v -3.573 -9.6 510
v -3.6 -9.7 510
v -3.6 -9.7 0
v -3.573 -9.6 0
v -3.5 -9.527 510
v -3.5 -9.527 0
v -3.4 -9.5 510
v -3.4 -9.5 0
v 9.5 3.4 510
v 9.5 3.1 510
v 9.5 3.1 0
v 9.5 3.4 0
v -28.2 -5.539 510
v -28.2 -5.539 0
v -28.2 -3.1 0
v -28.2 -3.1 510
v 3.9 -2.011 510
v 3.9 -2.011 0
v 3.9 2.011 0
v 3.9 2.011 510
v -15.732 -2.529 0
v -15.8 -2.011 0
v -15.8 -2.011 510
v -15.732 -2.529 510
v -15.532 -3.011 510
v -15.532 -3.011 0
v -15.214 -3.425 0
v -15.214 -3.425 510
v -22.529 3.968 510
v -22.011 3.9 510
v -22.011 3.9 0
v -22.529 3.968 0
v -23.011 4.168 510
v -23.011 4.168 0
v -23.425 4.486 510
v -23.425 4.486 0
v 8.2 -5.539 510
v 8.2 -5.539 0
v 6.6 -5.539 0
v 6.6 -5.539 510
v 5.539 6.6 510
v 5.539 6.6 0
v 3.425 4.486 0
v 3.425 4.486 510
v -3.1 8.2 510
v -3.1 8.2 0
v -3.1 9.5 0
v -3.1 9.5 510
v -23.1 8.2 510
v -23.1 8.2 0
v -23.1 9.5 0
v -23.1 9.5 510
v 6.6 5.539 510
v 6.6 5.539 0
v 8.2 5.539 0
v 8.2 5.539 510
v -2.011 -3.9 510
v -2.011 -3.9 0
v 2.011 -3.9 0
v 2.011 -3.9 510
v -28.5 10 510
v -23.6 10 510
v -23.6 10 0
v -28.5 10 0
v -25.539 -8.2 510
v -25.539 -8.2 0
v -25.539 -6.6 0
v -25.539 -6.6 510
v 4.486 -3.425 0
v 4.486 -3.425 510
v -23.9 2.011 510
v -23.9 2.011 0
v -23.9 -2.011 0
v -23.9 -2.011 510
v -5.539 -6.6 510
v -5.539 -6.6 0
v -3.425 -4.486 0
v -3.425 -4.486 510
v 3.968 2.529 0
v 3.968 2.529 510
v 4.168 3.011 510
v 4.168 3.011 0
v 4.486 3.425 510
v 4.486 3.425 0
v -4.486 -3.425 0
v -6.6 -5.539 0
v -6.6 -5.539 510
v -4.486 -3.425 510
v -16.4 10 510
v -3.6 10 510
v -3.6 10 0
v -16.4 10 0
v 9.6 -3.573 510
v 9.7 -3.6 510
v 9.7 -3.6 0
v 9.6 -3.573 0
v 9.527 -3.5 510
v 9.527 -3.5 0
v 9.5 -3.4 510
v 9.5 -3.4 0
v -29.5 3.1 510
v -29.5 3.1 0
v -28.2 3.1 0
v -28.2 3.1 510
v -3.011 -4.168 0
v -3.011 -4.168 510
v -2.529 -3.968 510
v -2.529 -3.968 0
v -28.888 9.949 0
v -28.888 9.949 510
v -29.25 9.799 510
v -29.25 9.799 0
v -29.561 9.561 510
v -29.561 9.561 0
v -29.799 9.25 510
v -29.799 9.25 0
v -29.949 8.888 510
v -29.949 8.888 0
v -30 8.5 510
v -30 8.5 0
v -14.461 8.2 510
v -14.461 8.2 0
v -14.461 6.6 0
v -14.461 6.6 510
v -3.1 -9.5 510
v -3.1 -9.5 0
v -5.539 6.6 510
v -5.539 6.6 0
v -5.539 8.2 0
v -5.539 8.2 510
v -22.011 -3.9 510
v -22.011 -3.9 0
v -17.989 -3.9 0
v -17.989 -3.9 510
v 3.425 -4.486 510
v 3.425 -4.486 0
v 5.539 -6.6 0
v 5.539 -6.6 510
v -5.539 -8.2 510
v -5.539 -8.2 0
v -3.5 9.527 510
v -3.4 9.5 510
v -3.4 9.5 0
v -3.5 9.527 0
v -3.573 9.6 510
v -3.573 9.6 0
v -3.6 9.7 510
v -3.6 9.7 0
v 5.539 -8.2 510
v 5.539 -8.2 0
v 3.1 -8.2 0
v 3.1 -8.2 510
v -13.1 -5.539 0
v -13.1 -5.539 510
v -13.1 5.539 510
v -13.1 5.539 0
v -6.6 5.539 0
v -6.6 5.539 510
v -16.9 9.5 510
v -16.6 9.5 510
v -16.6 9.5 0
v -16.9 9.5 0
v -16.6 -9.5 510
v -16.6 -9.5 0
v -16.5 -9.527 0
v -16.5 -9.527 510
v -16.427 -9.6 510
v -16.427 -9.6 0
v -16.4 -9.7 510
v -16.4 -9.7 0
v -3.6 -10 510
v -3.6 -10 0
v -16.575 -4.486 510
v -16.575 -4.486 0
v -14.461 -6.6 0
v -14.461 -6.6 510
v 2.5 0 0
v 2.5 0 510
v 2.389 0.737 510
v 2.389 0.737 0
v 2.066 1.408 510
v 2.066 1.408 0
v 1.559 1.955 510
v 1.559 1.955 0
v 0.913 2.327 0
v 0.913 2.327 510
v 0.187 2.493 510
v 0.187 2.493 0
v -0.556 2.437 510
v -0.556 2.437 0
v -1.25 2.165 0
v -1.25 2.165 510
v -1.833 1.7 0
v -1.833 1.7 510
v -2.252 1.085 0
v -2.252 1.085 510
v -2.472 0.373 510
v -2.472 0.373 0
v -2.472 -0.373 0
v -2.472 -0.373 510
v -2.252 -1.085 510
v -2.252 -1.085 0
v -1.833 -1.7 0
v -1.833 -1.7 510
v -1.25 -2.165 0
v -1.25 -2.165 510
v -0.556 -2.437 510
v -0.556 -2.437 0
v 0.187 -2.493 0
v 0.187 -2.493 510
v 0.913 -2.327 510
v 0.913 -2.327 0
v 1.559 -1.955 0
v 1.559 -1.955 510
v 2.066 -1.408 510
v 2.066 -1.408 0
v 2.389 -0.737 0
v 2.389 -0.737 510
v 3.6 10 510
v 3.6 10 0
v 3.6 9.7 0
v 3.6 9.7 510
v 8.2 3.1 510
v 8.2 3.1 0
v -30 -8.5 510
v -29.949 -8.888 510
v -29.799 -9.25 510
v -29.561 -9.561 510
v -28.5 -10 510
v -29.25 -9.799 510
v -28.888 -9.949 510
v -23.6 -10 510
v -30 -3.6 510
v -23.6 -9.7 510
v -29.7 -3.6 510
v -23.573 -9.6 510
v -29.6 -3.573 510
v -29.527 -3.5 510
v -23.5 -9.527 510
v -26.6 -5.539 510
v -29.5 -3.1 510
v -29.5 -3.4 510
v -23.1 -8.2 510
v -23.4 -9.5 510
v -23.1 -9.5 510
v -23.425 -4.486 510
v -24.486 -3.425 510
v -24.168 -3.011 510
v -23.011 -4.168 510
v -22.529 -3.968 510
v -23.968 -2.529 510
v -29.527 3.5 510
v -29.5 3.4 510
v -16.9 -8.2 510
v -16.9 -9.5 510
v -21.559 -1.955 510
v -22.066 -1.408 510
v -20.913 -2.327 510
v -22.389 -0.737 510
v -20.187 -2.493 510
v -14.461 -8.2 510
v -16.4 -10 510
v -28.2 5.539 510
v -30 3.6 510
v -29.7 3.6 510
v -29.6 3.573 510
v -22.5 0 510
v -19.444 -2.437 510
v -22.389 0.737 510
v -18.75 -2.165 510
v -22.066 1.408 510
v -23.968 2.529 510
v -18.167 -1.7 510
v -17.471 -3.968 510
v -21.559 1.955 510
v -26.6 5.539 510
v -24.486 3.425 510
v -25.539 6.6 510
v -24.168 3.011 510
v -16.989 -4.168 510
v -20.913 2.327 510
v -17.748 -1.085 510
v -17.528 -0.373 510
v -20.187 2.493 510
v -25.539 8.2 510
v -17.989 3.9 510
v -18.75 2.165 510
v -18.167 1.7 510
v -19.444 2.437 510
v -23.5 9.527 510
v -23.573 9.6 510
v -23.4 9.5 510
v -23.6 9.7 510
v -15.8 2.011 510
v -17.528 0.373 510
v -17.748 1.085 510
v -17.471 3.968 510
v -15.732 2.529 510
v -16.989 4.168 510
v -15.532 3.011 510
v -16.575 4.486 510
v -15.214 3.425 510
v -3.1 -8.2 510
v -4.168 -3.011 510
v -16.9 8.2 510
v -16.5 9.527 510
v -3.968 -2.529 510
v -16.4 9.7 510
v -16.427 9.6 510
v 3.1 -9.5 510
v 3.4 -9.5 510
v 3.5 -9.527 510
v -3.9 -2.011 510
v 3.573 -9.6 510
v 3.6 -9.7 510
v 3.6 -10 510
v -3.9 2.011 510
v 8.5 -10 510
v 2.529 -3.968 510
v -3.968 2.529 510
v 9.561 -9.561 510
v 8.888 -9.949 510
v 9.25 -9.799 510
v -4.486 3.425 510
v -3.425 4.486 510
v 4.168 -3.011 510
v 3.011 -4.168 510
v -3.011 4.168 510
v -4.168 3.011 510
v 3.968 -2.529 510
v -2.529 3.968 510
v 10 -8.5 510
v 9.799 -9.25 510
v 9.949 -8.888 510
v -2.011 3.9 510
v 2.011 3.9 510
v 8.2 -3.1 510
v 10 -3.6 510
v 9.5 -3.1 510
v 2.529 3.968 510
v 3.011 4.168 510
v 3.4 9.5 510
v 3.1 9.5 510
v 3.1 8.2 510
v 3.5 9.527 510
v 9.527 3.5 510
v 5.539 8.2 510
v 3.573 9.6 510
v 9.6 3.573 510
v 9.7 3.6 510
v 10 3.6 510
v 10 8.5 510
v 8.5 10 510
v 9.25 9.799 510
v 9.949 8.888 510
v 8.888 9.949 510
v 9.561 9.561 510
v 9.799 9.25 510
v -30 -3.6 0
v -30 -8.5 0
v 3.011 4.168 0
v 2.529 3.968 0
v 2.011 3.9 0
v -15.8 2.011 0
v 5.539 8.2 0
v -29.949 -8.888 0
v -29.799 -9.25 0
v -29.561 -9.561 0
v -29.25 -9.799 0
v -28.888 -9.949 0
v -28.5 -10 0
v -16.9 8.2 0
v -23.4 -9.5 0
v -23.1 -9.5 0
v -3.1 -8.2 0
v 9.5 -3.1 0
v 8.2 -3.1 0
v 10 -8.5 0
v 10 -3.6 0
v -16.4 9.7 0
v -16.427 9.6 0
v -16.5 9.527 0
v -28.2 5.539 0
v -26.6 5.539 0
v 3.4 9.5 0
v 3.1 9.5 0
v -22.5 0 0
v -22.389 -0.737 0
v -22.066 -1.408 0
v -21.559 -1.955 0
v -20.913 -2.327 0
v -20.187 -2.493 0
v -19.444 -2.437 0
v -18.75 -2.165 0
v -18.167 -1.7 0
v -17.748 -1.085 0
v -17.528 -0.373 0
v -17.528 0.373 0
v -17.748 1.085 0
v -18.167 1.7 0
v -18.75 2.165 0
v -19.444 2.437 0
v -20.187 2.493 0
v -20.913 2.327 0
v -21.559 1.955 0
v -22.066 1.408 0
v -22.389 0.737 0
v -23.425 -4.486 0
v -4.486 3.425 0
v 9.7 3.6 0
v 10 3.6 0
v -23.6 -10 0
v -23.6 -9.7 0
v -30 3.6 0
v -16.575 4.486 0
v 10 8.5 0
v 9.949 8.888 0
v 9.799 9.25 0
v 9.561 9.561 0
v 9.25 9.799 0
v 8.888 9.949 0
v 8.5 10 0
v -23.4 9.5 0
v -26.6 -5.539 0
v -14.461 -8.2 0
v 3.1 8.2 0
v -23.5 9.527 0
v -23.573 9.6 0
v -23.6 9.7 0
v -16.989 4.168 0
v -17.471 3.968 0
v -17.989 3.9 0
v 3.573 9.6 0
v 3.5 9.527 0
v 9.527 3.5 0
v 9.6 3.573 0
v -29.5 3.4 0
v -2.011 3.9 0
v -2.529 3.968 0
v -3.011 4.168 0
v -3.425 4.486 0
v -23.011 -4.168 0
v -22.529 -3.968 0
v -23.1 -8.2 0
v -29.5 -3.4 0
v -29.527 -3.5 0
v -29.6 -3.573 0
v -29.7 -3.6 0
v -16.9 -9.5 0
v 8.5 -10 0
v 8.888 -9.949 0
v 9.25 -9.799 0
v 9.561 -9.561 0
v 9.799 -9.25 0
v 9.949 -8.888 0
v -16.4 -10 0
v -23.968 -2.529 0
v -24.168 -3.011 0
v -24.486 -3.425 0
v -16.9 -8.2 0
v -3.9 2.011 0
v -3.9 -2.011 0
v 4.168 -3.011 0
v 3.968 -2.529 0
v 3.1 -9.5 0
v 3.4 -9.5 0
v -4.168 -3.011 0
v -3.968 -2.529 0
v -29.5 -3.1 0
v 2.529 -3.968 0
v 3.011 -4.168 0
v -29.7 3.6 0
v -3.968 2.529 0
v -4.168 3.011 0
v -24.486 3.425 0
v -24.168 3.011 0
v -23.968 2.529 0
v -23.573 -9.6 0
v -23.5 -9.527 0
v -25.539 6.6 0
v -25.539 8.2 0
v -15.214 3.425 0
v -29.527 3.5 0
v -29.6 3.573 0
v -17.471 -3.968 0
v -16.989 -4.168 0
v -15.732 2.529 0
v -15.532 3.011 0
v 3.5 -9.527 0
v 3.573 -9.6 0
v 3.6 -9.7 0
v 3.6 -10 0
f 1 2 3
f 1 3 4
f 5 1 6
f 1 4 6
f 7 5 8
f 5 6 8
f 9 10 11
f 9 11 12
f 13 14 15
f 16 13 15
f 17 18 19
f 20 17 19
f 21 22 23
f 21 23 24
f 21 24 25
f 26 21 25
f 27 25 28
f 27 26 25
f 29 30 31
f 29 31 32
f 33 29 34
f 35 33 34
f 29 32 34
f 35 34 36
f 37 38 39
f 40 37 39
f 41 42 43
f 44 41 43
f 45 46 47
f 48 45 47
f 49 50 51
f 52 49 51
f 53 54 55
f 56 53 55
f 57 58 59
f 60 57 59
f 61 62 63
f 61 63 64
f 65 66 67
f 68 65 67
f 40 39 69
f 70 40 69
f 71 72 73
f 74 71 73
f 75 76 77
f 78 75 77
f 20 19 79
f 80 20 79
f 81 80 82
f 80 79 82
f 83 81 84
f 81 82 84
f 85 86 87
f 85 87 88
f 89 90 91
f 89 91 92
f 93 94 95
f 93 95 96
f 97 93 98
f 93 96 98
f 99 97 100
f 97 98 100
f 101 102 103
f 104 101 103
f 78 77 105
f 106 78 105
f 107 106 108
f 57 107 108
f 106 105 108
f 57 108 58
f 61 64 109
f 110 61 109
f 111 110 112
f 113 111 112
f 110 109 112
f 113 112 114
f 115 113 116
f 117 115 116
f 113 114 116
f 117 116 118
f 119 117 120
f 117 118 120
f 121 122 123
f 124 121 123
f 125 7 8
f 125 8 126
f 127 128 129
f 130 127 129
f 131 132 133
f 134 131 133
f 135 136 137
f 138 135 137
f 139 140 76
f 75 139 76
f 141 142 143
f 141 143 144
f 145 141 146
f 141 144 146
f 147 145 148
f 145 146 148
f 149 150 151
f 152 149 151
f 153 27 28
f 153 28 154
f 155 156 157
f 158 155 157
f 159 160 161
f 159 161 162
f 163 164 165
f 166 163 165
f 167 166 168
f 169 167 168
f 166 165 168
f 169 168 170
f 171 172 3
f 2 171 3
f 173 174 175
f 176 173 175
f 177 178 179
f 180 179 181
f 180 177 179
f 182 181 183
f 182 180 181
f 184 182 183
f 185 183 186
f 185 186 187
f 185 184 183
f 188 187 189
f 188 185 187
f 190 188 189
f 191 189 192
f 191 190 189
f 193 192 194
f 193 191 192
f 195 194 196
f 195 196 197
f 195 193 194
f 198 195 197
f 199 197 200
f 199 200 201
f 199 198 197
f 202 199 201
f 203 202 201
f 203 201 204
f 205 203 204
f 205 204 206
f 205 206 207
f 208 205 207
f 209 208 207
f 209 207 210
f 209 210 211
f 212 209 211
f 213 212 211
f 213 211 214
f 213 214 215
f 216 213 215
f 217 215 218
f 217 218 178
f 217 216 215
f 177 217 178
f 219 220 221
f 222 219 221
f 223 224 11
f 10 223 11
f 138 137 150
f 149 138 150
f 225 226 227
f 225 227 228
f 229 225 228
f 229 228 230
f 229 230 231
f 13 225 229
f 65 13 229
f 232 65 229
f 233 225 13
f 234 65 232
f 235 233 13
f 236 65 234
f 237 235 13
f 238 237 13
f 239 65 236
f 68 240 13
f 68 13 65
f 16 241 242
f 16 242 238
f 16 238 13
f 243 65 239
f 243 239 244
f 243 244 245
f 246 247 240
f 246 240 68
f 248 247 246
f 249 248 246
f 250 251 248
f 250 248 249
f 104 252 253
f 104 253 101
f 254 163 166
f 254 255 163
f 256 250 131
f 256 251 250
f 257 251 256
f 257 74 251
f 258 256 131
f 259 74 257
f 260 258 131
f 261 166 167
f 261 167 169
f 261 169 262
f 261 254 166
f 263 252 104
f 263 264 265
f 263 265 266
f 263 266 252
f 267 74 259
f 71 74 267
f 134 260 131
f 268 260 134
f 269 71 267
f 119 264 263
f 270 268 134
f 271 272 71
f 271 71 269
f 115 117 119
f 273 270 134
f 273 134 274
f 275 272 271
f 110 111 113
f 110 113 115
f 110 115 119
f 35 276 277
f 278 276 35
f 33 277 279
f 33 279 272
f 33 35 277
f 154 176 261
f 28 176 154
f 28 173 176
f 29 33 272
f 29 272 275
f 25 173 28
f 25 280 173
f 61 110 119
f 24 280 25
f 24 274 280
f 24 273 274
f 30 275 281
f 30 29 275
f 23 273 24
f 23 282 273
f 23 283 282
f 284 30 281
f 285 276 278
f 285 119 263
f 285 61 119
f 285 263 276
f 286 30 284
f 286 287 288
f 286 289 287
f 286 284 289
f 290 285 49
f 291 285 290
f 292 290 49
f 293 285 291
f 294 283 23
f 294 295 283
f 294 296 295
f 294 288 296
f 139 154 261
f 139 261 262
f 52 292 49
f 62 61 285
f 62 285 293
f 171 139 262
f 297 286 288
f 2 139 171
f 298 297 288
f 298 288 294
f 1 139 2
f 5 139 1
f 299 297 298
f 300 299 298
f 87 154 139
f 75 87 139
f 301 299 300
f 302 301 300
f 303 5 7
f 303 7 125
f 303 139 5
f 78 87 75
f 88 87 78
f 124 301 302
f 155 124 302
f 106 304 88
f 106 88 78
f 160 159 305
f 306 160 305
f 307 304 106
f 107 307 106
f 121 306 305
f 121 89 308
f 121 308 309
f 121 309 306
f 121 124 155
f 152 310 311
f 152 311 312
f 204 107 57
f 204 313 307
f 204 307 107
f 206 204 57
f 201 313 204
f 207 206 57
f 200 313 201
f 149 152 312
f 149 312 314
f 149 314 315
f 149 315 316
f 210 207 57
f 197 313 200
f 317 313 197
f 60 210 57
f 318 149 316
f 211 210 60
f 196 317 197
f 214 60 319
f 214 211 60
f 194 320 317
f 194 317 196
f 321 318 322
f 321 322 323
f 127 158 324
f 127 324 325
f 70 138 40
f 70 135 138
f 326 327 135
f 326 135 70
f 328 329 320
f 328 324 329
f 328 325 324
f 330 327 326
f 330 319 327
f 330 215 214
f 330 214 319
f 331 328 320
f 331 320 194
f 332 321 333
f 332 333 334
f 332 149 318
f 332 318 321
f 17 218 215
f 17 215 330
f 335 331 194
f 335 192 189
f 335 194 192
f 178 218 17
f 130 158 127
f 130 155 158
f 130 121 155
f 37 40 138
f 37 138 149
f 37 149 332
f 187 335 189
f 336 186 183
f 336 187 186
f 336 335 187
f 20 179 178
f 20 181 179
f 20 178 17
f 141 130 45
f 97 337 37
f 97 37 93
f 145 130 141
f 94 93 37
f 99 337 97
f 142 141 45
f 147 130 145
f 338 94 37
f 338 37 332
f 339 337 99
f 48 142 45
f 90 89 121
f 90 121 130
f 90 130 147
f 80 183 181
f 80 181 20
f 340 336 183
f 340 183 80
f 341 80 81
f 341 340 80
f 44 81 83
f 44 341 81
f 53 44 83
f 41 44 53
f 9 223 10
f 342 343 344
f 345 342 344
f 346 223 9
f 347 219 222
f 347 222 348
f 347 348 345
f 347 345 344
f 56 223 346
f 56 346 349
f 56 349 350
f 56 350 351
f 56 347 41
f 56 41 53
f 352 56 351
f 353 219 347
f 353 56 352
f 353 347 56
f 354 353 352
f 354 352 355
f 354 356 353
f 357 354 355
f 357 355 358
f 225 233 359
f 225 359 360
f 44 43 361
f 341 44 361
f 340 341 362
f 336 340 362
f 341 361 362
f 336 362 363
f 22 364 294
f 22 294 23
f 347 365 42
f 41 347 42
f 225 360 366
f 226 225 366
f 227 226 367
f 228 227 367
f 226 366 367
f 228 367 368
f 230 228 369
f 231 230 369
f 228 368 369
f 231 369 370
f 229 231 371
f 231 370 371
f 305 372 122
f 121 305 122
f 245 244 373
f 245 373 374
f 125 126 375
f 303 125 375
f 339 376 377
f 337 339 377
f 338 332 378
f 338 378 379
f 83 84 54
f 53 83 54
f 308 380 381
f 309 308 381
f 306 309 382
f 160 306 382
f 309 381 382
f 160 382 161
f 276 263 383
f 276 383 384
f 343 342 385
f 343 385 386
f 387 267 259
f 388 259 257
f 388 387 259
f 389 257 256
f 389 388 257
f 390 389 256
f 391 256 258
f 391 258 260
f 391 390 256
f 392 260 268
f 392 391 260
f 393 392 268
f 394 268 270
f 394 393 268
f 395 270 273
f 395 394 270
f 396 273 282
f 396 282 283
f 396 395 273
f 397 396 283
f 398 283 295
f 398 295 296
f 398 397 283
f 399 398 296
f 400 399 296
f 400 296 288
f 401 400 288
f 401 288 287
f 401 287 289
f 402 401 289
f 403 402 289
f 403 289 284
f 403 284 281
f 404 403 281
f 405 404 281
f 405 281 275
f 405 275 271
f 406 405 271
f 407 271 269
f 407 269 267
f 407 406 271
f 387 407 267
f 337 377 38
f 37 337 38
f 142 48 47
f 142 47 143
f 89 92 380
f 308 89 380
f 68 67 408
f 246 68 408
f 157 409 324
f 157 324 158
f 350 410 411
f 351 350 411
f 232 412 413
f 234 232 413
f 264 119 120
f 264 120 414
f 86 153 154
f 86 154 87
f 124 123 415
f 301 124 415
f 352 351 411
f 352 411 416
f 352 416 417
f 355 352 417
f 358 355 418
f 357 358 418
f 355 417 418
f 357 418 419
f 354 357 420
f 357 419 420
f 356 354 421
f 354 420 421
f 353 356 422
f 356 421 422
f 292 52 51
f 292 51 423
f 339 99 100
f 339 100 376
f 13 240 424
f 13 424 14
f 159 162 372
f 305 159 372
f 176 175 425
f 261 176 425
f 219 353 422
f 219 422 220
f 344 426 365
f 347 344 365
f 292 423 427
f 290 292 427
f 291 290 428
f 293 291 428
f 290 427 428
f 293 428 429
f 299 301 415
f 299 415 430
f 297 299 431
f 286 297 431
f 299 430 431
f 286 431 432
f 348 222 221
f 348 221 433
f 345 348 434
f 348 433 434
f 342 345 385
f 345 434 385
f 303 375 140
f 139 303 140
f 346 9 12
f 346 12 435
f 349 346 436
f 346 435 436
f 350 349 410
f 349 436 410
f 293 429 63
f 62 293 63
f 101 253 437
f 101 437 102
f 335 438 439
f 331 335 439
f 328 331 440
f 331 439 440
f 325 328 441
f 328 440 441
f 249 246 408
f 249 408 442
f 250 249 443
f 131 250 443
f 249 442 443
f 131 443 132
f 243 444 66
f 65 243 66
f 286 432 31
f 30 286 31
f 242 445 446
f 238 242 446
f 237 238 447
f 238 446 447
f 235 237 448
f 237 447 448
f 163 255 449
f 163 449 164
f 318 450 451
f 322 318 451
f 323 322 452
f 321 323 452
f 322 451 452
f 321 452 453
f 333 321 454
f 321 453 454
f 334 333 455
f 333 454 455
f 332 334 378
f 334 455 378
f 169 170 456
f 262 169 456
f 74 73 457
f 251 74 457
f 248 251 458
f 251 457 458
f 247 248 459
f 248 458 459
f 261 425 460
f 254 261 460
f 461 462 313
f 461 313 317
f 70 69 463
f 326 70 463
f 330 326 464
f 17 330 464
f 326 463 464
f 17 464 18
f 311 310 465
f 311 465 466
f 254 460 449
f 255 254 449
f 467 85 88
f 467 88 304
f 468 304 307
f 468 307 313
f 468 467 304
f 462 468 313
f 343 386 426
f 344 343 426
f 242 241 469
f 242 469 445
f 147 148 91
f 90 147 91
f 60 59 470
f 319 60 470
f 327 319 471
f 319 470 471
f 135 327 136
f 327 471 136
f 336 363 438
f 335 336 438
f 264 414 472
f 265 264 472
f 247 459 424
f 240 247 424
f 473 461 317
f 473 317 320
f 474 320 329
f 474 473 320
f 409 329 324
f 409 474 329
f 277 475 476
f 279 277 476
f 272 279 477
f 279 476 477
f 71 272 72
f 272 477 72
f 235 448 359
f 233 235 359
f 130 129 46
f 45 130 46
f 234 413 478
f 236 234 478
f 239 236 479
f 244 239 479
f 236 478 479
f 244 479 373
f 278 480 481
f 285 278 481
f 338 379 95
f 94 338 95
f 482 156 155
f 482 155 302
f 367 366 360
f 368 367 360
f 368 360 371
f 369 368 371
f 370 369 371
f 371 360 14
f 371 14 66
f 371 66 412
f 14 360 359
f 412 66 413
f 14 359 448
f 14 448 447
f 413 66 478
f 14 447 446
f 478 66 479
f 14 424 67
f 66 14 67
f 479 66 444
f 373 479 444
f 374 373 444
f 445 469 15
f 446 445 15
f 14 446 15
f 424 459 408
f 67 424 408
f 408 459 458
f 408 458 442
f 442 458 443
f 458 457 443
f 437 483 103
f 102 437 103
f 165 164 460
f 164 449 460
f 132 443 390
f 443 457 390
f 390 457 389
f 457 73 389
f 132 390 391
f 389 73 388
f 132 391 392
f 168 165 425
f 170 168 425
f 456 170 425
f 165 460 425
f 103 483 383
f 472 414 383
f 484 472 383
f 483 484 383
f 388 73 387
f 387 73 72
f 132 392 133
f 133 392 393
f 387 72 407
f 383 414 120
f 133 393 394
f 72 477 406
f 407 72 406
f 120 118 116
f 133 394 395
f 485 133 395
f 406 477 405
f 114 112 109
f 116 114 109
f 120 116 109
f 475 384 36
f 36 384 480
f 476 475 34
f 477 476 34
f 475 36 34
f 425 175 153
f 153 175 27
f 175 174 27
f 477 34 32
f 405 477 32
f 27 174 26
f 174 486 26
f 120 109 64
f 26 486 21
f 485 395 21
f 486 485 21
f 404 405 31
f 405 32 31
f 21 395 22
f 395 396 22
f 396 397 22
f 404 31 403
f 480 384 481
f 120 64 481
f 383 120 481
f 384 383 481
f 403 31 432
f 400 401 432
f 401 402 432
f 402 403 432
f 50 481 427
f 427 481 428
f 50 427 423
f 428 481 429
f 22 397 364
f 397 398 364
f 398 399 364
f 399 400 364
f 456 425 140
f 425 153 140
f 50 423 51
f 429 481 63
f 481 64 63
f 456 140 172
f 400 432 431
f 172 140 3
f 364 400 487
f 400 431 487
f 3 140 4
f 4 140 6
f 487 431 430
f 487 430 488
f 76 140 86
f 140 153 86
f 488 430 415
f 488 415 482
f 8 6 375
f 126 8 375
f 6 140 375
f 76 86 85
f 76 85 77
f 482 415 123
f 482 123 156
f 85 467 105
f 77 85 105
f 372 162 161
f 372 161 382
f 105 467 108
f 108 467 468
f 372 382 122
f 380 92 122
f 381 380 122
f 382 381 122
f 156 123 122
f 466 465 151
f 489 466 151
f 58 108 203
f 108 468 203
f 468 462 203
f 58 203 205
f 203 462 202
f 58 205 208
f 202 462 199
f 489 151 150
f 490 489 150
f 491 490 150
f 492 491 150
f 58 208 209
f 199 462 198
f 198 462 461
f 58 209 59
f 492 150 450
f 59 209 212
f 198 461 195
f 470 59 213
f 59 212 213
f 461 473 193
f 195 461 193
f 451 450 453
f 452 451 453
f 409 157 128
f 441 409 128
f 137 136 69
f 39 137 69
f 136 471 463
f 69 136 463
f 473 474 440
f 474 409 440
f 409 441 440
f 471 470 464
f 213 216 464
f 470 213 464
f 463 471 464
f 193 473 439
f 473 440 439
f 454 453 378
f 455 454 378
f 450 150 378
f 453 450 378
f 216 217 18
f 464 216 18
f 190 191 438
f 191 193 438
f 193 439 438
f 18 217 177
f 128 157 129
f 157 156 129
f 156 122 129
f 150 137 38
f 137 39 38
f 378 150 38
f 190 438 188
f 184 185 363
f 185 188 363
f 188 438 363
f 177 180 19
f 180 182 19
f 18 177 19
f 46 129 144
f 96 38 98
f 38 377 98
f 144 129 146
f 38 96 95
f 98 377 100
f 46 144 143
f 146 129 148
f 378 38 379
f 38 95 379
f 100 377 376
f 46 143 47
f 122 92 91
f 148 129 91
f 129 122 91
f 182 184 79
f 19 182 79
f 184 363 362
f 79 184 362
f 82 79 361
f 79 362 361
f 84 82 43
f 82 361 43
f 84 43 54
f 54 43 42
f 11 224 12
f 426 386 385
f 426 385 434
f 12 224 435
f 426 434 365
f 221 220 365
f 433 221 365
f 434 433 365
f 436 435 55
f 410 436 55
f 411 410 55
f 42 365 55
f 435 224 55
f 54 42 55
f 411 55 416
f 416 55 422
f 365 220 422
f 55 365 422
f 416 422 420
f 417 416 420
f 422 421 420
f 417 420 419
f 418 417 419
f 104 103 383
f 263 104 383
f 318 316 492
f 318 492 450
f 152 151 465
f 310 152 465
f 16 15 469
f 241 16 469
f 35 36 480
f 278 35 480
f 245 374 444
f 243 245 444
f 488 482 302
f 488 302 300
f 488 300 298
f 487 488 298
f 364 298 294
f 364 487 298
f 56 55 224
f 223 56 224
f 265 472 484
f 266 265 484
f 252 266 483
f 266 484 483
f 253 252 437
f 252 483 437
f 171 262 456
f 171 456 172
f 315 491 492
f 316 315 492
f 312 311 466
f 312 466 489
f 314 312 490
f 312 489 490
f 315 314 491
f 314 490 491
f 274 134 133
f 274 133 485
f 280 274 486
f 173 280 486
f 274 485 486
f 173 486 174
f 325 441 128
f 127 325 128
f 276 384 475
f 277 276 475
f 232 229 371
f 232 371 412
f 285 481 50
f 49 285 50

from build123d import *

# Parameters (mm, degrees)
SKETCH1_R               = 2.5
EXTRUDE1_DEPTH          = 510
CUT_EXTRUDE1_DEPTH      = 511.979451642
CUT_EXTRUDE1_DEPTH_BACK = 511.979451642
SKETCH2_W               = 3.3
SKETCH2_H               = 11.078679656


with BuildPart() as part:
    # Sketch1 → Extrude1 (new body)
    with BuildSketch(Plane.XY):
        with BuildLine():
            Line((0, 3.9), (-2.010912703, 3.9))
            ThreePointArc((-2.010912703, 3.9), (-2.776279568, 4.052240935), (-3.425126266, 4.485786438))
            Line((-3.425126266, 4.485786438), (-5.539339828, 6.6))
            Line((-5.539339828, 6.6), (-5.539339828, 8.2))
            Line((-5.539339828, 8.2), (-3.1, 8.2))
            Line((-3.1, 8.2), (-3.1, 9.5))
            Line((-3.1, 9.5), (-3.4, 9.5))
            ThreePointArc((-3.4, 9.5), (-3.541421356, 9.558578644), (-3.6, 9.7))
            Line((-3.6, 9.7), (-3.6, 10))
            Line((-3.6, 10), (-8.5, 10))
            Line((-8.5, 10), (-11.5, 10))
            Line((-11.5, 10), (-16.4, 10))
            Line((-16.4, 10), (-16.4, 9.7))
            ThreePointArc((-16.4, 9.7), (-16.458578644, 9.558578644), (-16.6, 9.5))
            Line((-16.6, 9.5), (-16.9, 9.5))
            Line((-16.9, 9.5), (-16.9, 8.2))
            Line((-16.9, 8.2), (-14.460660172, 8.2))
            Line((-14.460660172, 8.2), (-14.460660172, 6.6))
            Line((-14.460660172, 6.6), (-16.574873734, 4.485786438))
            ThreePointArc((-16.574873734, 4.485786438), (-17.223720432, 4.052240935), (-17.989087297, 3.9))
            Line((-17.989087297, 3.9), (-20, 3.9))
            Line((-20, 3.9), (-22.010912703, 3.9))
            ThreePointArc((-22.010912703, 3.9), (-22.776279568, 4.052240935), (-23.425126266, 4.485786438))
            Line((-23.425126266, 4.485786438), (-25.539339828, 6.6))
            Line((-25.539339828, 6.6), (-25.539339828, 8.2))
            Line((-25.539339828, 8.2), (-23.1, 8.2))
            Line((-23.1, 8.2), (-23.1, 9.5))
            Line((-23.1, 9.5), (-23.4, 9.5))
            ThreePointArc((-23.4, 9.5), (-23.541421356, 9.558578644), (-23.6, 9.7))
            Line((-23.6, 9.7), (-23.6, 10))
            Line((-23.6, 10), (-28.5, 10))
            ThreePointArc((-28.5, 10), (-29.560660172, 9.560660172), (-30, 8.5))
            Line((-30, 8.5), (-30, 3.6))
            Line((-30, 3.6), (-29.7, 3.6))
            ThreePointArc((-29.7, 3.6), (-29.558578644, 3.541421356), (-29.5, 3.4))
            Line((-29.5, 3.4), (-29.5, 3.1))
            Line((-29.5, 3.1), (-28.2, 3.1))
            Line((-28.2, 3.1), (-28.2, 5.539339828))
            Line((-28.2, 5.539339828), (-26.6, 5.539339828))
            Line((-26.6, 5.539339828), (-24.485786438, 3.425126266))
            ThreePointArc((-24.485786438, 3.425126266), (-24.052240935, 2.776279568), (-23.9, 2.010912703))
            Line((-23.9, 2.010912703), (-23.9, 0))
            Line((-23.9, 0), (-23.9, -2.010912703))
            ThreePointArc((-23.9, -2.010912703), (-24.052240935, -2.776279568), (-24.485786438, -3.425126266))
            Line((-24.485786438, -3.425126266), (-26.6, -5.539339828))
            Line((-26.6, -5.539339828), (-28.2, -5.539339828))
            Line((-28.2, -5.539339828), (-28.2, -3.1))
            Line((-28.2, -3.1), (-29.5, -3.1))
            Line((-29.5, -3.1), (-29.5, -3.4))
            ThreePointArc((-29.5, -3.4), (-29.558578644, -3.541421356), (-29.7, -3.6))
            Line((-29.7, -3.6), (-30, -3.6))
            Line((-30, -3.6), (-30, -8.5))
            ThreePointArc((-30, -8.5), (-29.560660172, -9.560660172), (-28.5, -10))
            Line((-28.5, -10), (-23.6, -10))
            Line((-23.6, -10), (-23.6, -9.7))
            ThreePointArc((-23.6, -9.7), (-23.541421356, -9.558578644), (-23.4, -9.5))
            Line((-23.4, -9.5), (-23.1, -9.5))
            Line((-23.1, -9.5), (-23.1, -8.2))
            Line((-23.1, -8.2), (-25.539339828, -8.2))
            Line((-25.539339828, -8.2), (-25.539339828, -6.6))
            Line((-25.539339828, -6.6), (-23.425126266, -4.485786438))
            ThreePointArc((-23.425126266, -4.485786438), (-22.776279568, -4.052240935), (-22.010912703, -3.9))
            Line((-22.010912703, -3.9), (-20, -3.9))
            Line((-20, -3.9), (-17.989087297, -3.9))
            ThreePointArc((-17.989087297, -3.9), (-17.223720432, -4.052240935), (-16.574873734, -4.485786438))
            Line((-16.574873734, -4.485786438), (-14.460660172, -6.6))
            Line((-14.460660172, -6.6), (-14.460660172, -8.2))
            Line((-14.460660172, -8.2), (-16.9, -8.2))
            Line((-16.9, -8.2), (-16.9, -9.5))
            Line((-16.9, -9.5), (-16.6, -9.5))
            ThreePointArc((-16.6, -9.5), (-16.458578644, -9.558578644), (-16.4, -9.7))
            Line((-16.4, -9.7), (-16.4, -10))
            Line((-16.4, -10), (-11.5, -10))
            Line((-11.5, -10), (-8.5, -10))
            Line((-8.5, -10), (-3.6, -10))
            Line((-3.6, -10), (-3.6, -9.7))
            ThreePointArc((-3.6, -9.7), (-3.541421356, -9.558578644), (-3.4, -9.5))
            Line((-3.4, -9.5), (-3.1, -9.5))
            Line((-3.1, -9.5), (-3.1, -8.2))
            Line((-3.1, -8.2), (-5.539339828, -8.2))
            Line((-5.539339828, -8.2), (-5.539339828, -6.6))
            Line((-5.539339828, -6.6), (-3.425126266, -4.485786438))
            ThreePointArc((-3.425126266, -4.485786438), (-2.776279568, -4.052240935), (-2.010912703, -3.9))
            Line((-2.010912703, -3.9), (0, -3.9))
            Line((0, -3.9), (2.010912703, -3.9))
            ThreePointArc((2.010912703, -3.9), (2.776279568, -4.052240935), (3.425126266, -4.485786438))
            Line((3.425126266, -4.485786438), (5.539339828, -6.6))
            Line((5.539339828, -6.6), (5.539339828, -8.2))
            Line((5.539339828, -8.2), (3.1, -8.2))
            Line((3.1, -8.2), (3.1, -9.5))
            Line((3.1, -9.5), (3.4, -9.5))
            ThreePointArc((3.4, -9.5), (3.541421356, -9.558578644), (3.6, -9.7))
            Line((3.6, -9.7), (3.6, -10))
            Line((3.6, -10), (8.5, -10))
            ThreePointArc((8.5, -10), (9.560660172, -9.560660172), (10, -8.5))
            Line((10, -8.5), (10, -3.6))
            Line((10, -3.6), (9.7, -3.6))
            ThreePointArc((9.7, -3.6), (9.558578644, -3.541421356), (9.5, -3.4))
            Line((9.5, -3.4), (9.5, -3.1))
            Line((9.5, -3.1), (8.2, -3.1))
            Line((8.2, -3.1), (8.2, -5.539339828))
            Line((8.2, -5.539339828), (6.6, -5.539339828))
            Line((6.6, -5.539339828), (4.485786438, -3.425126266))
            ThreePointArc((4.485786438, -3.425126266), (4.052240935, -2.776279568), (3.9, -2.010912703))
            Line((3.9, -2.010912703), (3.9, 0))
            Line((3.9, 0), (3.9, 2.010912703))
            ThreePointArc((3.9, 2.010912703), (4.052240935, 2.776279568), (4.485786438, 3.425126266))
            Line((4.485786438, 3.425126266), (6.6, 5.539339828))
            Line((6.6, 5.539339828), (8.2, 5.539339828))
            Line((8.2, 5.539339828), (8.2, 3.1))
            Line((8.2, 3.1), (9.5, 3.1))
            Line((9.5, 3.1), (9.5, 3.4))
            ThreePointArc((9.5, 3.4), (9.558578644, 3.541421356), (9.7, 3.6))
            Line((9.7, 3.6), (10, 3.6))
            Line((10, 3.6), (10, 8.5))
            ThreePointArc((10, 8.5), (9.560660172, 9.560660172), (8.5, 10))
            Line((8.5, 10), (3.6, 10))
            Line((3.6, 10), (3.6, 9.7))
            ThreePointArc((3.6, 9.7), (3.541421356, 9.558578644), (3.4, 9.5))
            Line((3.4, 9.5), (3.1, 9.5))
            Line((3.1, 9.5), (3.1, 8.2))
            Line((3.1, 8.2), (5.539339828, 8.2))
            Line((5.539339828, 8.2), (5.539339828, 6.6))
            Line((5.539339828, 6.6), (3.425126266, 4.485786438))
            ThreePointArc((3.425126266, 4.485786438), (2.776279568, 4.052240935), (2.010912703, 3.9))
            Line((2.010912703, 3.9), (0, 3.9))
        make_face()
        Circle(SKETCH1_R, mode=Mode.SUBTRACT)
        with Locations(Location((-20, 0, 0), (0, 0, 180))):
            Circle(SKETCH1_R, mode=Mode.SUBTRACT)
        with BuildLine():
            Line((-9.7, 3.6), (-10, 3.6))
            ThreePointArc((-10, 3.6), (-10.141421356, 3.541421356), (-10.2, 3.4))
            Line((-10.2, 3.4), (-10.2, 3.1))
            Line((-10.2, 3.1), (-11.5, 3.1))
            Line((-11.5, 3.1), (-11.5, 5.539339828))
            Line((-11.5, 5.539339828), (-13.1, 5.539339828))
            Line((-13.1, 5.539339828), (-15.214213562, 3.425126266))
            ThreePointArc((-15.214213562, 3.425126266), (-15.647759065, 2.776279568), (-15.8, 2.010912703))
            Line((-15.8, 2.010912703), (-15.8, 0))
            Line((-15.8, 0), (-15.8, -2.010912703))
            ThreePointArc((-15.8, -2.010912703), (-15.647759065, -2.776279568), (-15.214213562, -3.425126266))
            Line((-15.214213562, -3.425126266), (-13.1, -5.539339828))
            Line((-13.1, -5.539339828), (-11.5, -5.539339828))
            Line((-11.5, -5.539339828), (-11.5, -3.1))
            Line((-11.5, -3.1), (-10.2, -3.1))
            Line((-10.2, -3.1), (-10.2, -3.4))
            ThreePointArc((-10.2, -3.4), (-10.141421356, -3.541421356), (-10, -3.6))
            Line((-10, -3.6), (-9.7, -3.6))
            ThreePointArc((-9.7, -3.6), (-9.558578644, -3.541421356), (-9.5, -3.4))
            Line((-9.5, -3.4), (-9.5, -3.1))
            Line((-9.5, -3.1), (-8.2, -3.1))
            Line((-8.2, -3.1), (-8.2, -5.539339828))
            Line((-8.2, -5.539339828), (-6.6, -5.539339828))
            Line((-6.6, -5.539339828), (-4.485786438, -3.425126266))
            ThreePointArc((-4.485786438, -3.425126266), (-4.052240935, -2.776279568), (-3.9, -2.010912703))
            Line((-3.9, -2.010912703), (-3.9, 0))
            Line((-3.9, 0), (-3.9, 2.010912703))
            ThreePointArc((-3.9, 2.010912703), (-4.052240935, 2.776279568), (-4.485786438, 3.425126266))
            Line((-4.485786438, 3.425126266), (-6.6, 5.539339828))
            Line((-6.6, 5.539339828), (-8.2, 5.539339828))
            Line((-8.2, 5.539339828), (-8.2, 3.1))
            Line((-8.2, 3.1), (-9.5, 3.1))
            Line((-9.5, 3.1), (-9.5, 3.4))
            ThreePointArc((-9.5, 3.4), (-9.558578644, 3.541421356), (-9.7, 3.6))
        make_face(mode=Mode.SUBTRACT)
    extrude(amount=EXTRUDE1_DEPTH)

    # Sketch2 → Cut-Extrude1 (cut, two sides: drawn at the far end of the back side and taken through both)
    with BuildSketch(Plane.XY.offset(510).offset(-CUT_EXTRUDE1_DEPTH_BACK)):
        with Locations((-9.85, 0)):
            Rectangle(SKETCH2_W, SKETCH2_H)
    extrude(amount=CUT_EXTRUDE1_DEPTH + CUT_EXTRUDE1_DEPTH_BACK, mode=Mode.SUBTRACT)


solid = part.part
